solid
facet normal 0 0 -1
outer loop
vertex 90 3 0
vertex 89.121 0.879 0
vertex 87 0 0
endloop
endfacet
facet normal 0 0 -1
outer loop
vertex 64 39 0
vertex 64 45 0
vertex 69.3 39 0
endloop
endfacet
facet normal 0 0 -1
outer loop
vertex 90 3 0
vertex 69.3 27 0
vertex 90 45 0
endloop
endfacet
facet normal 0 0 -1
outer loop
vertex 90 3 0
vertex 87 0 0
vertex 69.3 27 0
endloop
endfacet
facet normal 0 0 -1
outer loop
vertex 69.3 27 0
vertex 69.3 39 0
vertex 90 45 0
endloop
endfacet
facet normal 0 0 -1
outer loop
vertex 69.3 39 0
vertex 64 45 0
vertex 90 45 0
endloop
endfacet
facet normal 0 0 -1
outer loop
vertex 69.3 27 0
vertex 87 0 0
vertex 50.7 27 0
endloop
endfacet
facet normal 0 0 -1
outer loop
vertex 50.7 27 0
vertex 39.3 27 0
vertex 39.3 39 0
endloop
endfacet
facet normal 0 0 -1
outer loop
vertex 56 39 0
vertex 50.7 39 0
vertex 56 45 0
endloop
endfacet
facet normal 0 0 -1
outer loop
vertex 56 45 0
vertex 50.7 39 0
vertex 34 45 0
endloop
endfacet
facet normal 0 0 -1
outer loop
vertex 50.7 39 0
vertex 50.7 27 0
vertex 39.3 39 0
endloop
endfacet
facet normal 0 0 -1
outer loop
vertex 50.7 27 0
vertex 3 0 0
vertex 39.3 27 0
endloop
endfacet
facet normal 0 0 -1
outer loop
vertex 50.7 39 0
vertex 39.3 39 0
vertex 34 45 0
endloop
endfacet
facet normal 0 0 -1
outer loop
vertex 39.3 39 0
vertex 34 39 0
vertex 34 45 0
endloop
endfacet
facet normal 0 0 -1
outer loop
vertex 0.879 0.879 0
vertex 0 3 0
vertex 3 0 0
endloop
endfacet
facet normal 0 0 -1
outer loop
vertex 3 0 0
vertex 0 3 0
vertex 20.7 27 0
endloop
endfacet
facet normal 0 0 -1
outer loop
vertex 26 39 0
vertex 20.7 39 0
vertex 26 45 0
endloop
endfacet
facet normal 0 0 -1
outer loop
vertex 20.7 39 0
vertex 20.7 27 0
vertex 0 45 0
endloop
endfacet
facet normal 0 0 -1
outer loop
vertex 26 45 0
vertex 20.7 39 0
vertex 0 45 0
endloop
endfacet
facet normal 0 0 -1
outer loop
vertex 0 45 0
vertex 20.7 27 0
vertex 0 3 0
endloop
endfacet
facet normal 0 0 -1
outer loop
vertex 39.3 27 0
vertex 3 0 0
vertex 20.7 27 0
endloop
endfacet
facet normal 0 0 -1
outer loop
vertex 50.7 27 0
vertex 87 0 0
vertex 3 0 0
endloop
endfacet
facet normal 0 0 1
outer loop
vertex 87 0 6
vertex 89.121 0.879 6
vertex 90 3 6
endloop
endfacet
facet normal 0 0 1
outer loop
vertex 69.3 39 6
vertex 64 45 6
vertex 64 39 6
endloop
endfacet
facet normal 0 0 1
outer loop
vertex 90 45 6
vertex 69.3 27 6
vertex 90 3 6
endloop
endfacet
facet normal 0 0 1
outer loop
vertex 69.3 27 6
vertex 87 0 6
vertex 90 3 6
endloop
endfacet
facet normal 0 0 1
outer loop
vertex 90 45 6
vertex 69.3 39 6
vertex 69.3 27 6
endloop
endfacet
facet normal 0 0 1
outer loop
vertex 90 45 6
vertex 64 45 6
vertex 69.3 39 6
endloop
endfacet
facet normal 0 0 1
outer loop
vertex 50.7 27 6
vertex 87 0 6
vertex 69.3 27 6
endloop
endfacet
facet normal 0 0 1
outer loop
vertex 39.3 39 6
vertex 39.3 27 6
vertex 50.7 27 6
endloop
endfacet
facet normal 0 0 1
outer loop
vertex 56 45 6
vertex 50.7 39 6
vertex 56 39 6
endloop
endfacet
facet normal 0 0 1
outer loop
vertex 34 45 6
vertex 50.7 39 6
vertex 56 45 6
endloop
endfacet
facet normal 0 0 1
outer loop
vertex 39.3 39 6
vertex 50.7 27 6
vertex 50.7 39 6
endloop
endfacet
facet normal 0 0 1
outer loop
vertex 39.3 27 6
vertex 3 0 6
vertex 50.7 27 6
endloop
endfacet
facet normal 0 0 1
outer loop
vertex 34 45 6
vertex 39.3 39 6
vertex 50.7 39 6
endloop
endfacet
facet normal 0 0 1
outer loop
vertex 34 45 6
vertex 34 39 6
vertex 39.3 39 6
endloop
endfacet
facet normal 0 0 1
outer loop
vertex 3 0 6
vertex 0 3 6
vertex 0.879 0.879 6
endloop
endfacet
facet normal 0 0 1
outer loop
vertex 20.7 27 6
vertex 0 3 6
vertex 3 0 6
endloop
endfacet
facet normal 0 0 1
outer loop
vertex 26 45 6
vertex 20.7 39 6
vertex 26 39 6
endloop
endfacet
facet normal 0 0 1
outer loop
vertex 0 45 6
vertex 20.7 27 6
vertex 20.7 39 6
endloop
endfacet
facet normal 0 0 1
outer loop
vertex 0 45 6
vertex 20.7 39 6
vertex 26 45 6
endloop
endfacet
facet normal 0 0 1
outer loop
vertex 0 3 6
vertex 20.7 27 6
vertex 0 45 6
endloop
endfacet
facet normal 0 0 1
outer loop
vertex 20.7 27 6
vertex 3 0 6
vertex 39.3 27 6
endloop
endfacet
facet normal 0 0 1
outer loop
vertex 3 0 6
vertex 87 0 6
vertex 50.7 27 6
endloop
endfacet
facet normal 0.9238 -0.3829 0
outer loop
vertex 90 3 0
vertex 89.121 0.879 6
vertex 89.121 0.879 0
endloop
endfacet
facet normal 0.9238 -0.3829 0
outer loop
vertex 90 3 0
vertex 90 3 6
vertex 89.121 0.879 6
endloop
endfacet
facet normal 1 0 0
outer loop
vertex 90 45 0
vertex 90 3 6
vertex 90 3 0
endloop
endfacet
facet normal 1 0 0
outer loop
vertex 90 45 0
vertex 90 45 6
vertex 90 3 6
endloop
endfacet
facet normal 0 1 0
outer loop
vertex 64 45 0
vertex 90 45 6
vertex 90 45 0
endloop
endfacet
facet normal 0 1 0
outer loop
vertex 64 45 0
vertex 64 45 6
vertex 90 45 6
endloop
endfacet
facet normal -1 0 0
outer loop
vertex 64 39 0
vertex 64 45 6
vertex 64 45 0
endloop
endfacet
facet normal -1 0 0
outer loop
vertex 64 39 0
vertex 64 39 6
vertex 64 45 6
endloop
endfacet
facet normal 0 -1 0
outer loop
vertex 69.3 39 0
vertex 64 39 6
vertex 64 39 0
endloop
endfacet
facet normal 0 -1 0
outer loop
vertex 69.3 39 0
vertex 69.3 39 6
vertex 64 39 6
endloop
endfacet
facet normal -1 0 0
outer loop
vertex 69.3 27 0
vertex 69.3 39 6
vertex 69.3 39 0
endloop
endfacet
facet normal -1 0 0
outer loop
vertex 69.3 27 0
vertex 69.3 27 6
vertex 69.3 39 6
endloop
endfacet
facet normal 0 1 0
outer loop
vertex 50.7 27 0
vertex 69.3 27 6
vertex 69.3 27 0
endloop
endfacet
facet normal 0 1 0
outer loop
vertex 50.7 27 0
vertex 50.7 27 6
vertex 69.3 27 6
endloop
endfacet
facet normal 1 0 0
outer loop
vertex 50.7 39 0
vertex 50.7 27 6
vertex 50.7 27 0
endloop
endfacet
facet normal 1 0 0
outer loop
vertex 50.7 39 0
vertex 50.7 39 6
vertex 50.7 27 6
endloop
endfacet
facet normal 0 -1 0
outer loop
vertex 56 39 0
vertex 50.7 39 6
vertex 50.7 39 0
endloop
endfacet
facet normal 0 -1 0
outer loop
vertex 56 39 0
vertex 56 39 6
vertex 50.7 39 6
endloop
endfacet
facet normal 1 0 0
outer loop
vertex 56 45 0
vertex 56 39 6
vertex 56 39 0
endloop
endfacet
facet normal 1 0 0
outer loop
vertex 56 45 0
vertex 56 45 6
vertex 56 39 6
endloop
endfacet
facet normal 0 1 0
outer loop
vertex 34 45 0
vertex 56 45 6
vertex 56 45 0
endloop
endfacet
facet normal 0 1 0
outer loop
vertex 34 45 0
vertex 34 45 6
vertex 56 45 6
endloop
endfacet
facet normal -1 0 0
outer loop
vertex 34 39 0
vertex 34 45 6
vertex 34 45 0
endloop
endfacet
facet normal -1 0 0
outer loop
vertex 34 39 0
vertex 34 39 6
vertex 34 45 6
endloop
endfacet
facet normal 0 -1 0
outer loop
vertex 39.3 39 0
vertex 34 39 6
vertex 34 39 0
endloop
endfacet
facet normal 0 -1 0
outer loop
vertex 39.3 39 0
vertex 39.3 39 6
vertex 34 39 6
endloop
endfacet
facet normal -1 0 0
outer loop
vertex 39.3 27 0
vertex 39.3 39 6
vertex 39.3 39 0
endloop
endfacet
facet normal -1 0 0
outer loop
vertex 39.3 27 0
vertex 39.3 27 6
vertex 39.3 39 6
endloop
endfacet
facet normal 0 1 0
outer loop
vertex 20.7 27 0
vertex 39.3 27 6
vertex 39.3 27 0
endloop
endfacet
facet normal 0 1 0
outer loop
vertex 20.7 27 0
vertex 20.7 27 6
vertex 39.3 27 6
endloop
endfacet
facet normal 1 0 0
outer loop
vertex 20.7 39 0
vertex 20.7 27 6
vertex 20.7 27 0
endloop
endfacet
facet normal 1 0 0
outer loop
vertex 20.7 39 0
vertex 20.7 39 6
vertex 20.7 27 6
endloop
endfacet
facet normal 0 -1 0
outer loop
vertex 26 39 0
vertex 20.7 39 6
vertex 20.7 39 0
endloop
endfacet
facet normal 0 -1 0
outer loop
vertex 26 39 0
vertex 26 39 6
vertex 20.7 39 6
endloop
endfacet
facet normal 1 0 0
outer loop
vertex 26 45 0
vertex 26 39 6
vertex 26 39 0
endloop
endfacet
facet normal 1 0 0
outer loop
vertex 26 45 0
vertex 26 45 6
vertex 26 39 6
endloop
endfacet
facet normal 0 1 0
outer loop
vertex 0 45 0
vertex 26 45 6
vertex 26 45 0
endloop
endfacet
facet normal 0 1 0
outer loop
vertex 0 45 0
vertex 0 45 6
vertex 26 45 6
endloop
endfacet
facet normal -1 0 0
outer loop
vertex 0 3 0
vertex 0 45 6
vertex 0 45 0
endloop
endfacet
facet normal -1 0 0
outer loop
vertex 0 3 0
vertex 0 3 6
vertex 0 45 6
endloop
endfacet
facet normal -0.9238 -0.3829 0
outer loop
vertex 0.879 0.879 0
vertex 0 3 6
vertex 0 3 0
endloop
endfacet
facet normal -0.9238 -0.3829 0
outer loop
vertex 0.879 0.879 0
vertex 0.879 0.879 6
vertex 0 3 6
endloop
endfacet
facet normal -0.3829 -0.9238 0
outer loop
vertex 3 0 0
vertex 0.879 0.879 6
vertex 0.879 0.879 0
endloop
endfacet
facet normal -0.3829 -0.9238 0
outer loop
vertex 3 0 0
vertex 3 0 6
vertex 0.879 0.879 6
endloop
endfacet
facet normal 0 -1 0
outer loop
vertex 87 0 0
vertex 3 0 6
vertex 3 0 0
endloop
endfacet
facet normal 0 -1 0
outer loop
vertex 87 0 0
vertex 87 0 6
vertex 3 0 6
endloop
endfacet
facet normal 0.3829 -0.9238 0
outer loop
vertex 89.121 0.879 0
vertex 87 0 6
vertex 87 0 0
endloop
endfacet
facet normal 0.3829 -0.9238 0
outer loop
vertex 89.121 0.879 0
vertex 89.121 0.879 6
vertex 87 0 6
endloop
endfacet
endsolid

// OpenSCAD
$fn = 32;

// ----------------------------------------------------------------------
// Window plate: 90 x 45 mm, 2 open windows
// ----------------------------------------------------------------------

// --- parameters (mm) ---
profile_height = 6;       // extrusion height
profile_points = 24;      // points of the closed outline

profile = [[0, 3], [0.879, 0.879], [3, 0], [87, 0], [89.121, 0.879], [90, 3], [90, 45], [64, 45], [64, 39], [69.3, 39], [69.3, 27], [50.7, 27], [50.7, 39], [56, 39], [56, 45], [34, 45], [34, 39], [39.3, 39], [39.3, 27], [20.7, 27], [20.7, 39], [26, 39], [26, 45], [0, 45]];  // single closed polygon, 24 points, counter clockwise

// --- the one profile operation ---
linear_extrude(height = profile_height) polygon(points = profile);
